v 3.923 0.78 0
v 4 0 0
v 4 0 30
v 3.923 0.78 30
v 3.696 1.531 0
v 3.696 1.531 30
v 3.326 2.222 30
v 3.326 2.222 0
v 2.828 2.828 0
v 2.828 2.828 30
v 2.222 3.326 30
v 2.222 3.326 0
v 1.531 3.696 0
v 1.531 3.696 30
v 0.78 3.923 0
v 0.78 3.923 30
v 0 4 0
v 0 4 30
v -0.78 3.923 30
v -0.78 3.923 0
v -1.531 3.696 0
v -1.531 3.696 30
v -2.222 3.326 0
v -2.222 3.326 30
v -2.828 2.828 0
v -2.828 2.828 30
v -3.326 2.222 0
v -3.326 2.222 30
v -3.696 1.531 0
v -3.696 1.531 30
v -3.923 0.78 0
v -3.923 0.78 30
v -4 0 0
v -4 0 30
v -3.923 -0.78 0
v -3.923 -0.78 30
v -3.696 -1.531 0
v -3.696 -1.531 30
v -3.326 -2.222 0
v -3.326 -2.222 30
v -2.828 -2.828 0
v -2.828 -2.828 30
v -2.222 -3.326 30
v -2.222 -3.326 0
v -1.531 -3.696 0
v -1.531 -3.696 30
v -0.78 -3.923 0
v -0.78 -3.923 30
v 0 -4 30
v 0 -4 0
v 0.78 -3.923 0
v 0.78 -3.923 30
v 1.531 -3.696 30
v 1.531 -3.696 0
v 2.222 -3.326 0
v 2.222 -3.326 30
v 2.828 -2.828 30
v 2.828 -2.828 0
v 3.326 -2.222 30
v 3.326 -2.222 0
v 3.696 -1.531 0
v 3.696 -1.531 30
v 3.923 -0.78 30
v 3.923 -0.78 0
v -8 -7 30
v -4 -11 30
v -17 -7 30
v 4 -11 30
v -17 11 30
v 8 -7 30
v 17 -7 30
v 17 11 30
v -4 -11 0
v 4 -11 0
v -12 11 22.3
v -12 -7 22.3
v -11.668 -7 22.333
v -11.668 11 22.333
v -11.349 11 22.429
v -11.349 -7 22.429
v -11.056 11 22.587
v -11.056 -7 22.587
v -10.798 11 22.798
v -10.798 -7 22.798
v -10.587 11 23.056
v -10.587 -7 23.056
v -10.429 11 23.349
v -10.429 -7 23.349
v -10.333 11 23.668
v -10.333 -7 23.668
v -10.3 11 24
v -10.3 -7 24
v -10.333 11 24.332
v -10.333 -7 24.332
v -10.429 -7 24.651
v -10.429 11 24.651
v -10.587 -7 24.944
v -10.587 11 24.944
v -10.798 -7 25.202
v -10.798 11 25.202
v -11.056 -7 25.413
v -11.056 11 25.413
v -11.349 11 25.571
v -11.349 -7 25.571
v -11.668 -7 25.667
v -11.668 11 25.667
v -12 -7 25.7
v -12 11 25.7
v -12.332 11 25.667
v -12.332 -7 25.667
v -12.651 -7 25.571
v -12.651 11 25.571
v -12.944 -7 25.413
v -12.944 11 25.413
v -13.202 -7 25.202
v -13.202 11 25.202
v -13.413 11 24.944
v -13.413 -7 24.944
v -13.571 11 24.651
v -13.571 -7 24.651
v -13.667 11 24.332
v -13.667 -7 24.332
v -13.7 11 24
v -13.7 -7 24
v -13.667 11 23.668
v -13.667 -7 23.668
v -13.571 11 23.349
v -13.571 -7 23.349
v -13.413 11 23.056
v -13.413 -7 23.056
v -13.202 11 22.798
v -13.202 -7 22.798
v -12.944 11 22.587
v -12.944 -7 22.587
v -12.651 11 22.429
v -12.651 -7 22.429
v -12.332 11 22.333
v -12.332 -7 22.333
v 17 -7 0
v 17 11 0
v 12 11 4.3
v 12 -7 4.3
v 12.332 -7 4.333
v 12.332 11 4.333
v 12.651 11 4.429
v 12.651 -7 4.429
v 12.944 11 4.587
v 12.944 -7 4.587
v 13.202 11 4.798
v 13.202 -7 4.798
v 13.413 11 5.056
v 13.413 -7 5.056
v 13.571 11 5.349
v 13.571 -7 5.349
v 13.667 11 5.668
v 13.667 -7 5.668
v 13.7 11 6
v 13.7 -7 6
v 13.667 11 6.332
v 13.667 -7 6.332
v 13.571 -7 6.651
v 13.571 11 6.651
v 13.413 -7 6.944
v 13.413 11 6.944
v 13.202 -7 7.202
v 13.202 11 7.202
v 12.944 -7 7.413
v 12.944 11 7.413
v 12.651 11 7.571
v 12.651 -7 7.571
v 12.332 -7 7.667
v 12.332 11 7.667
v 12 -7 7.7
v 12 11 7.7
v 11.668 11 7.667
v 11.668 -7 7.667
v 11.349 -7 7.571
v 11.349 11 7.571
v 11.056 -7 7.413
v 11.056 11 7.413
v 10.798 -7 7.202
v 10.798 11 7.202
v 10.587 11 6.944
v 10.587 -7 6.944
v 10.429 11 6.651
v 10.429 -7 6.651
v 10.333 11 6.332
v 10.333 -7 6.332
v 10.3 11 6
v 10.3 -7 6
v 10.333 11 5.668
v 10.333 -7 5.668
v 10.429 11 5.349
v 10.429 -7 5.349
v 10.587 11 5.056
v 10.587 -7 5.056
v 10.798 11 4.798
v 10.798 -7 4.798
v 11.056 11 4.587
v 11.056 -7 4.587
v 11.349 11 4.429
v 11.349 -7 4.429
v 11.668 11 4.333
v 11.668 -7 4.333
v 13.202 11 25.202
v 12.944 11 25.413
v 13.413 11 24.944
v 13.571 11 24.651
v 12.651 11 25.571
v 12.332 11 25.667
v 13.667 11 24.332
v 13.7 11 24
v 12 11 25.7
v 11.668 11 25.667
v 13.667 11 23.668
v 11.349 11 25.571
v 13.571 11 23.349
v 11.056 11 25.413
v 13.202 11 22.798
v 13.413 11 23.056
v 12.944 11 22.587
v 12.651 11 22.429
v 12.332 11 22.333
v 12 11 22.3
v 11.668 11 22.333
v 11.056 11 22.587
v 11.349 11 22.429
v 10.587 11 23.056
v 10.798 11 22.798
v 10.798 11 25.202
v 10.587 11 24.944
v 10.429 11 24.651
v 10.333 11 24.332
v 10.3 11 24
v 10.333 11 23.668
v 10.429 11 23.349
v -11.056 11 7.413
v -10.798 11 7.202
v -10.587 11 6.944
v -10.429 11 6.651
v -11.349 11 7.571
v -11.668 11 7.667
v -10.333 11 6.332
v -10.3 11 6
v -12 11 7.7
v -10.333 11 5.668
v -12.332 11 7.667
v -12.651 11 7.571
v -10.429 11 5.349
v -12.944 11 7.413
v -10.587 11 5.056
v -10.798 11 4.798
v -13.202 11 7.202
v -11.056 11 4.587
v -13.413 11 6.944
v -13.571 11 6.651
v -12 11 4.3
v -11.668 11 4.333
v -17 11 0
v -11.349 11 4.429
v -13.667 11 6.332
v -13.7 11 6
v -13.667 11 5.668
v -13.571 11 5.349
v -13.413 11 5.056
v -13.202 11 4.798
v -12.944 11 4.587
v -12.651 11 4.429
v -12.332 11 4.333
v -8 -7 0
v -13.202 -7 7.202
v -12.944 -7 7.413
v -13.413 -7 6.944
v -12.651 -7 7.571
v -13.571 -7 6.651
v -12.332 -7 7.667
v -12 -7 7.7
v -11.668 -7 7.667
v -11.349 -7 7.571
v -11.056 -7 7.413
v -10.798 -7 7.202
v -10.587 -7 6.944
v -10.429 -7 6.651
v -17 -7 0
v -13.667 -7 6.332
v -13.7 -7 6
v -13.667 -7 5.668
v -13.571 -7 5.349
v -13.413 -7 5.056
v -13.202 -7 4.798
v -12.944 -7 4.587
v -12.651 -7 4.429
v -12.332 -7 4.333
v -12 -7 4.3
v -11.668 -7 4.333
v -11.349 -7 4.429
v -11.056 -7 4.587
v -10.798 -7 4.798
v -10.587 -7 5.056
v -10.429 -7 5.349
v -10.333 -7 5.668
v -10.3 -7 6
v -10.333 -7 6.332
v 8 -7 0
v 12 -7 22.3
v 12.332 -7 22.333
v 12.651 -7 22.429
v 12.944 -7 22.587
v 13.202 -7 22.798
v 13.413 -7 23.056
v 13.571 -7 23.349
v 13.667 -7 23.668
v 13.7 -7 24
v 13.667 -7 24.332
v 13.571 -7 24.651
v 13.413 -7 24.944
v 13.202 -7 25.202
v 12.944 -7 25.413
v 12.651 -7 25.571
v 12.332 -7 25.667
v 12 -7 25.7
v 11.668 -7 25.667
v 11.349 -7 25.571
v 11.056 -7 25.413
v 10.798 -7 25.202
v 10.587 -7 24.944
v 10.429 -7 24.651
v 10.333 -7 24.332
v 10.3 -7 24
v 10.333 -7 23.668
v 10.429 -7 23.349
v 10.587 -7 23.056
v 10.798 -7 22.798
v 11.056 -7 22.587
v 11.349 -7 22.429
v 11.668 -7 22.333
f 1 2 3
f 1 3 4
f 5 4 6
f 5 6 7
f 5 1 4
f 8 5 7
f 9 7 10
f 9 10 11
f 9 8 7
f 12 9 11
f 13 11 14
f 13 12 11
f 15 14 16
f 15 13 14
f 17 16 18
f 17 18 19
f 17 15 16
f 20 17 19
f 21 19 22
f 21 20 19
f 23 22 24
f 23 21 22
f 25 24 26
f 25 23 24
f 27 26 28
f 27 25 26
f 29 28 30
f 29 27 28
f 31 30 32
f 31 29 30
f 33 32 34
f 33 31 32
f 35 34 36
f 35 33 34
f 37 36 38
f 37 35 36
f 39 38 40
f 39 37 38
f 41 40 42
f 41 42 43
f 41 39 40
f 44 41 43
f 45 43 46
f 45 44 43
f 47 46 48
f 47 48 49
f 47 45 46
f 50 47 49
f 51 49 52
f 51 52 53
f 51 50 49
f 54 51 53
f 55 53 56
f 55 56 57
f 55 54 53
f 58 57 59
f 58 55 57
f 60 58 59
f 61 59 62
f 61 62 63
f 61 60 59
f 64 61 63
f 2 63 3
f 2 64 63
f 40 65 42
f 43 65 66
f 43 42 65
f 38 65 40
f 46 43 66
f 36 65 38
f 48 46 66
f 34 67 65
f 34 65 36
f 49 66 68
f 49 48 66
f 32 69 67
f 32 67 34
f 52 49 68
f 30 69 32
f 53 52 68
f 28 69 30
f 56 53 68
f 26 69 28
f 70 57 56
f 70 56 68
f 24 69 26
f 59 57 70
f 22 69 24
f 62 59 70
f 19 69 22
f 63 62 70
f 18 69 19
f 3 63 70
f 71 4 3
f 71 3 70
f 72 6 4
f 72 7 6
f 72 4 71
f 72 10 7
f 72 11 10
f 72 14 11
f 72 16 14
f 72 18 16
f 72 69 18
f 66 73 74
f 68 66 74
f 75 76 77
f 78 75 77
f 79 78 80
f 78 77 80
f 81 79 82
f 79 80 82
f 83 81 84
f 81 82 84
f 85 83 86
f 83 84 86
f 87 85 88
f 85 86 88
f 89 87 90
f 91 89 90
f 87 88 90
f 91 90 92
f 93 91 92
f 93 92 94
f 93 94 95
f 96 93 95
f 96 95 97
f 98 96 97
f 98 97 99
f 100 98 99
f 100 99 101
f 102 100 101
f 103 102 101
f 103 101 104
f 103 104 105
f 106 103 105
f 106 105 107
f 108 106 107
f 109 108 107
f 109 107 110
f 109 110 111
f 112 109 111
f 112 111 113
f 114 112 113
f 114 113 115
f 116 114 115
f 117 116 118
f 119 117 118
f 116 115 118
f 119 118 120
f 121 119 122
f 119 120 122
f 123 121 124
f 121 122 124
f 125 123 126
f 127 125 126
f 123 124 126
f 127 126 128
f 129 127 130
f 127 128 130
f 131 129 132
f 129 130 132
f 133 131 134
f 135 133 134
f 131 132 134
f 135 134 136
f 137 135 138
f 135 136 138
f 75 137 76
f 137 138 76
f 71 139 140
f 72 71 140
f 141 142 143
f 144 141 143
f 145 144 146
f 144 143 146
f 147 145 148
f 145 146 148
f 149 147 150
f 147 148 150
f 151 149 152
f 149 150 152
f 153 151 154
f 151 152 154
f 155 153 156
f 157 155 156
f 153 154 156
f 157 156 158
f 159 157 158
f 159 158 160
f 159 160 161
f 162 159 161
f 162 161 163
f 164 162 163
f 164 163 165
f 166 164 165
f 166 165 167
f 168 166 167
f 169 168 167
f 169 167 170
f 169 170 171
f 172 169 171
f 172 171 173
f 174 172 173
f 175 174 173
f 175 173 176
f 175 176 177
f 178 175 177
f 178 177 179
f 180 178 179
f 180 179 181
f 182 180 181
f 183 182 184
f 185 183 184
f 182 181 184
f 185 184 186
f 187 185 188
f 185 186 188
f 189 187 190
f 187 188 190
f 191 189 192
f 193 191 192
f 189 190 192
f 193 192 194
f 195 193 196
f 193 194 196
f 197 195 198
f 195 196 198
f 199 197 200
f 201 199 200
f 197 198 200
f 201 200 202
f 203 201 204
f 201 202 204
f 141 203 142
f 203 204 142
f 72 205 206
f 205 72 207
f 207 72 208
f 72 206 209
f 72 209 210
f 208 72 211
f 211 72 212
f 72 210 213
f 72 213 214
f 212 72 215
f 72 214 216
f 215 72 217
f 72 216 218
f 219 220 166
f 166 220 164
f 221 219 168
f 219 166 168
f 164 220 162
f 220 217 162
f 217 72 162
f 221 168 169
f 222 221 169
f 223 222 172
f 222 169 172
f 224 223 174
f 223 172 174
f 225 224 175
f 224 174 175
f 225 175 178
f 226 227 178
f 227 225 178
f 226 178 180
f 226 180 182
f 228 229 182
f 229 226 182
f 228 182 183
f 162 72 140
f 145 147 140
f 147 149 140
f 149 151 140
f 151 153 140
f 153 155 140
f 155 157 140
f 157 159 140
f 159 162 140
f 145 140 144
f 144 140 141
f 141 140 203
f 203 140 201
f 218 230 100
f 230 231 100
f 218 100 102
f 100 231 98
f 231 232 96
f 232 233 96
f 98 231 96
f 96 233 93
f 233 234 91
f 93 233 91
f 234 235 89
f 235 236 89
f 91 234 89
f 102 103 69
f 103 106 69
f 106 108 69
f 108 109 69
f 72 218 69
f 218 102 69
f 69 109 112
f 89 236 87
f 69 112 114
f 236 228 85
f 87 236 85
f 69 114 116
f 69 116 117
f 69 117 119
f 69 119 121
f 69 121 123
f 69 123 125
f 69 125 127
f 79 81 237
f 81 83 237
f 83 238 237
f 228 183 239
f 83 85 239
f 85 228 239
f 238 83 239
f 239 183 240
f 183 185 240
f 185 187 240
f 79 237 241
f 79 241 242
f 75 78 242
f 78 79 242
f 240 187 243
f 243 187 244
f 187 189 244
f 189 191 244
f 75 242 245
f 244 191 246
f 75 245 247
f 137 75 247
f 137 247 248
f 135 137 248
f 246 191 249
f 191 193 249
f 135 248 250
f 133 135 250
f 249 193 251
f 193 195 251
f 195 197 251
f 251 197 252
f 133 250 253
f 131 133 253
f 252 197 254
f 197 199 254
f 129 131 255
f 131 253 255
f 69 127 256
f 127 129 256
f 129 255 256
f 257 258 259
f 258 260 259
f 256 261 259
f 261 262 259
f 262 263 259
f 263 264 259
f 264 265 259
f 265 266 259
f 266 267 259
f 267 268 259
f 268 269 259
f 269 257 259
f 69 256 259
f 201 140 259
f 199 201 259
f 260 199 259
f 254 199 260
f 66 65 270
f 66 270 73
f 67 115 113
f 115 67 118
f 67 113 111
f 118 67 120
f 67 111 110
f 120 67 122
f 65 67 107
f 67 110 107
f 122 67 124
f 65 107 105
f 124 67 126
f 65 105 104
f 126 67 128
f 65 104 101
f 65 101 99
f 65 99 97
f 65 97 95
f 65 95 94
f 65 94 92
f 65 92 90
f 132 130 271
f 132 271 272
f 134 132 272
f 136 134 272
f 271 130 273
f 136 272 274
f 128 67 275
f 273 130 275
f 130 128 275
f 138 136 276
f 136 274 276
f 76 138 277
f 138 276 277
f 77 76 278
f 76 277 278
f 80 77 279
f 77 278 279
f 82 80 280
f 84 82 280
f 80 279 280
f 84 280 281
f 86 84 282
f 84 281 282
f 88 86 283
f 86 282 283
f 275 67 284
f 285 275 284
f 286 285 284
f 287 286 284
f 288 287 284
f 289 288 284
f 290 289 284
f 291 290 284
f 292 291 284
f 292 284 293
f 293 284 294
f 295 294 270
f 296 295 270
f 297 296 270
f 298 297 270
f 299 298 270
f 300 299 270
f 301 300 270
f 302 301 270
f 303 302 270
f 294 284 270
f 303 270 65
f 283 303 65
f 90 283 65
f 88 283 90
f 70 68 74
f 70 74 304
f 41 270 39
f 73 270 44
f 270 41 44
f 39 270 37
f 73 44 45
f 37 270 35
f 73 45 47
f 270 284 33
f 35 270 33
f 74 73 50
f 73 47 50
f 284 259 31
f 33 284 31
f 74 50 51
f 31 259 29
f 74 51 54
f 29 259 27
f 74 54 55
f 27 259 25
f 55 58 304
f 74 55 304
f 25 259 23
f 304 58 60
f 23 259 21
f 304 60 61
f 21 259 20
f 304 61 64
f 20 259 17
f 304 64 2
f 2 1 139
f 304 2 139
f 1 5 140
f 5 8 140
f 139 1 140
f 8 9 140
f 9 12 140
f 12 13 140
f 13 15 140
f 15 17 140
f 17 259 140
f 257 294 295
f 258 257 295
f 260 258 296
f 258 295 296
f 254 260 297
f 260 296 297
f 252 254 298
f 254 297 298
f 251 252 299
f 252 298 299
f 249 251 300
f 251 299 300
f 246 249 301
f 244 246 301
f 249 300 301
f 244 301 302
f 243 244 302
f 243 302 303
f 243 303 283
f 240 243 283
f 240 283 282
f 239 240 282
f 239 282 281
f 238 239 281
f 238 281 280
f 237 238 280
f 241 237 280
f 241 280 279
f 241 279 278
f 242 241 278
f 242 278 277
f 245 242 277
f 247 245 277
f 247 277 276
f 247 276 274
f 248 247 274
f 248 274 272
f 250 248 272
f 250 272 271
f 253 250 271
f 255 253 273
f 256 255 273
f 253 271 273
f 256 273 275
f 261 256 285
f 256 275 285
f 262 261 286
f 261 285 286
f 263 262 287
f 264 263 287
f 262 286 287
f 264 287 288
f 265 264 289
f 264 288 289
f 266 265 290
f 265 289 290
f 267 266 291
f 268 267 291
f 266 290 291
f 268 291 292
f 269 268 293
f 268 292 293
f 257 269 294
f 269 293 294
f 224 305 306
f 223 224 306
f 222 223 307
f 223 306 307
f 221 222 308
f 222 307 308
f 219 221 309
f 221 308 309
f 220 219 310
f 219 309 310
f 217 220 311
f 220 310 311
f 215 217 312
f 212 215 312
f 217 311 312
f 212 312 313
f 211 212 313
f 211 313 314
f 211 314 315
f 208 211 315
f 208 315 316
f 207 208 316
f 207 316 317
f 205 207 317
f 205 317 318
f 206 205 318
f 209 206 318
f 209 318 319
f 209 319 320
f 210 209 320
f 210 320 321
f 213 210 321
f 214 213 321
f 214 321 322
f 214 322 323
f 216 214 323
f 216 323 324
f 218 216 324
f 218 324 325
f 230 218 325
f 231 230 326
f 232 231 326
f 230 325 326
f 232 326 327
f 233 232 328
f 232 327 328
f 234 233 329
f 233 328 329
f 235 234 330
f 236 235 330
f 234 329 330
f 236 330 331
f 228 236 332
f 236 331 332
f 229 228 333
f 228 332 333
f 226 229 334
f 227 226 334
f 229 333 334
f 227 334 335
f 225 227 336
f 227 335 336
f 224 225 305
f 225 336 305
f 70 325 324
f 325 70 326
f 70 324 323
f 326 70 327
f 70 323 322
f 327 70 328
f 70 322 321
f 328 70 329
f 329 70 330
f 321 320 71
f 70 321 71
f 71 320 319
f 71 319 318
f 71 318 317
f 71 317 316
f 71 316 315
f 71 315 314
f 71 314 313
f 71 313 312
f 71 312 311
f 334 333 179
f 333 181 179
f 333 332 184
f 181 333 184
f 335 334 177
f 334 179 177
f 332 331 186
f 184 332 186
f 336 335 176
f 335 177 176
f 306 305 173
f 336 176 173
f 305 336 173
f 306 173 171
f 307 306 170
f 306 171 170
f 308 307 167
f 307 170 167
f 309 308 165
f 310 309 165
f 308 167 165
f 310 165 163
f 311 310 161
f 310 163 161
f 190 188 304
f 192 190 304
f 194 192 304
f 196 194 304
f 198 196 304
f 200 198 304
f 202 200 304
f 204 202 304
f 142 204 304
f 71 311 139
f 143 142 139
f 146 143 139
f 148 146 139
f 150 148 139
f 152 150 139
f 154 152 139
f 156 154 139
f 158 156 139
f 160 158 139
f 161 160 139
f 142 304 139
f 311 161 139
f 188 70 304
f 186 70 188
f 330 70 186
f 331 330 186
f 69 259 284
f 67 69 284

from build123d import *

# Parameters (mm, degrees)
SKETCH_1_R          = 4
EXTRUDE_1_DEPTH     = 30
SKETCH_2_R          = 1.7
CUT_EXTRUDE_1_DEPTH = 20


with BuildPart() as part:
    # 草图1 → 凸台-拉伸1 (new body)
    with BuildSketch(Plane.XY):
        Polygon((-17, -7), (-8, -7), (-4, -11), (4, -11), (8, -7), (17, -7), (17, 11), (-17, 11), align=None)
        Circle(SKETCH_1_R, mode=Mode.SUBTRACT)
    extrude(amount=EXTRUDE_1_DEPTH)

    # 草图2 → 切除-拉伸1 (cut)
    with BuildSketch(Plane.XZ.offset(7)):
        with Locations(Location((-12, 24, 0), (0, 0, 270))):
            Circle(SKETCH_2_R)
        with Locations(Location((-12, 6, 0), (0, 0, 270))):
            Circle(SKETCH_2_R)
        with Locations(Location((12, 24, 0), (0, 0, 270))):
            Circle(SKETCH_2_R)
        with Locations(Location((12, 6, 0), (0, 0, 270))):
            Circle(SKETCH_2_R)
    extrude(amount=-CUT_EXTRUDE_1_DEPTH, mode=Mode.SUBTRACT)


solid = part.part
